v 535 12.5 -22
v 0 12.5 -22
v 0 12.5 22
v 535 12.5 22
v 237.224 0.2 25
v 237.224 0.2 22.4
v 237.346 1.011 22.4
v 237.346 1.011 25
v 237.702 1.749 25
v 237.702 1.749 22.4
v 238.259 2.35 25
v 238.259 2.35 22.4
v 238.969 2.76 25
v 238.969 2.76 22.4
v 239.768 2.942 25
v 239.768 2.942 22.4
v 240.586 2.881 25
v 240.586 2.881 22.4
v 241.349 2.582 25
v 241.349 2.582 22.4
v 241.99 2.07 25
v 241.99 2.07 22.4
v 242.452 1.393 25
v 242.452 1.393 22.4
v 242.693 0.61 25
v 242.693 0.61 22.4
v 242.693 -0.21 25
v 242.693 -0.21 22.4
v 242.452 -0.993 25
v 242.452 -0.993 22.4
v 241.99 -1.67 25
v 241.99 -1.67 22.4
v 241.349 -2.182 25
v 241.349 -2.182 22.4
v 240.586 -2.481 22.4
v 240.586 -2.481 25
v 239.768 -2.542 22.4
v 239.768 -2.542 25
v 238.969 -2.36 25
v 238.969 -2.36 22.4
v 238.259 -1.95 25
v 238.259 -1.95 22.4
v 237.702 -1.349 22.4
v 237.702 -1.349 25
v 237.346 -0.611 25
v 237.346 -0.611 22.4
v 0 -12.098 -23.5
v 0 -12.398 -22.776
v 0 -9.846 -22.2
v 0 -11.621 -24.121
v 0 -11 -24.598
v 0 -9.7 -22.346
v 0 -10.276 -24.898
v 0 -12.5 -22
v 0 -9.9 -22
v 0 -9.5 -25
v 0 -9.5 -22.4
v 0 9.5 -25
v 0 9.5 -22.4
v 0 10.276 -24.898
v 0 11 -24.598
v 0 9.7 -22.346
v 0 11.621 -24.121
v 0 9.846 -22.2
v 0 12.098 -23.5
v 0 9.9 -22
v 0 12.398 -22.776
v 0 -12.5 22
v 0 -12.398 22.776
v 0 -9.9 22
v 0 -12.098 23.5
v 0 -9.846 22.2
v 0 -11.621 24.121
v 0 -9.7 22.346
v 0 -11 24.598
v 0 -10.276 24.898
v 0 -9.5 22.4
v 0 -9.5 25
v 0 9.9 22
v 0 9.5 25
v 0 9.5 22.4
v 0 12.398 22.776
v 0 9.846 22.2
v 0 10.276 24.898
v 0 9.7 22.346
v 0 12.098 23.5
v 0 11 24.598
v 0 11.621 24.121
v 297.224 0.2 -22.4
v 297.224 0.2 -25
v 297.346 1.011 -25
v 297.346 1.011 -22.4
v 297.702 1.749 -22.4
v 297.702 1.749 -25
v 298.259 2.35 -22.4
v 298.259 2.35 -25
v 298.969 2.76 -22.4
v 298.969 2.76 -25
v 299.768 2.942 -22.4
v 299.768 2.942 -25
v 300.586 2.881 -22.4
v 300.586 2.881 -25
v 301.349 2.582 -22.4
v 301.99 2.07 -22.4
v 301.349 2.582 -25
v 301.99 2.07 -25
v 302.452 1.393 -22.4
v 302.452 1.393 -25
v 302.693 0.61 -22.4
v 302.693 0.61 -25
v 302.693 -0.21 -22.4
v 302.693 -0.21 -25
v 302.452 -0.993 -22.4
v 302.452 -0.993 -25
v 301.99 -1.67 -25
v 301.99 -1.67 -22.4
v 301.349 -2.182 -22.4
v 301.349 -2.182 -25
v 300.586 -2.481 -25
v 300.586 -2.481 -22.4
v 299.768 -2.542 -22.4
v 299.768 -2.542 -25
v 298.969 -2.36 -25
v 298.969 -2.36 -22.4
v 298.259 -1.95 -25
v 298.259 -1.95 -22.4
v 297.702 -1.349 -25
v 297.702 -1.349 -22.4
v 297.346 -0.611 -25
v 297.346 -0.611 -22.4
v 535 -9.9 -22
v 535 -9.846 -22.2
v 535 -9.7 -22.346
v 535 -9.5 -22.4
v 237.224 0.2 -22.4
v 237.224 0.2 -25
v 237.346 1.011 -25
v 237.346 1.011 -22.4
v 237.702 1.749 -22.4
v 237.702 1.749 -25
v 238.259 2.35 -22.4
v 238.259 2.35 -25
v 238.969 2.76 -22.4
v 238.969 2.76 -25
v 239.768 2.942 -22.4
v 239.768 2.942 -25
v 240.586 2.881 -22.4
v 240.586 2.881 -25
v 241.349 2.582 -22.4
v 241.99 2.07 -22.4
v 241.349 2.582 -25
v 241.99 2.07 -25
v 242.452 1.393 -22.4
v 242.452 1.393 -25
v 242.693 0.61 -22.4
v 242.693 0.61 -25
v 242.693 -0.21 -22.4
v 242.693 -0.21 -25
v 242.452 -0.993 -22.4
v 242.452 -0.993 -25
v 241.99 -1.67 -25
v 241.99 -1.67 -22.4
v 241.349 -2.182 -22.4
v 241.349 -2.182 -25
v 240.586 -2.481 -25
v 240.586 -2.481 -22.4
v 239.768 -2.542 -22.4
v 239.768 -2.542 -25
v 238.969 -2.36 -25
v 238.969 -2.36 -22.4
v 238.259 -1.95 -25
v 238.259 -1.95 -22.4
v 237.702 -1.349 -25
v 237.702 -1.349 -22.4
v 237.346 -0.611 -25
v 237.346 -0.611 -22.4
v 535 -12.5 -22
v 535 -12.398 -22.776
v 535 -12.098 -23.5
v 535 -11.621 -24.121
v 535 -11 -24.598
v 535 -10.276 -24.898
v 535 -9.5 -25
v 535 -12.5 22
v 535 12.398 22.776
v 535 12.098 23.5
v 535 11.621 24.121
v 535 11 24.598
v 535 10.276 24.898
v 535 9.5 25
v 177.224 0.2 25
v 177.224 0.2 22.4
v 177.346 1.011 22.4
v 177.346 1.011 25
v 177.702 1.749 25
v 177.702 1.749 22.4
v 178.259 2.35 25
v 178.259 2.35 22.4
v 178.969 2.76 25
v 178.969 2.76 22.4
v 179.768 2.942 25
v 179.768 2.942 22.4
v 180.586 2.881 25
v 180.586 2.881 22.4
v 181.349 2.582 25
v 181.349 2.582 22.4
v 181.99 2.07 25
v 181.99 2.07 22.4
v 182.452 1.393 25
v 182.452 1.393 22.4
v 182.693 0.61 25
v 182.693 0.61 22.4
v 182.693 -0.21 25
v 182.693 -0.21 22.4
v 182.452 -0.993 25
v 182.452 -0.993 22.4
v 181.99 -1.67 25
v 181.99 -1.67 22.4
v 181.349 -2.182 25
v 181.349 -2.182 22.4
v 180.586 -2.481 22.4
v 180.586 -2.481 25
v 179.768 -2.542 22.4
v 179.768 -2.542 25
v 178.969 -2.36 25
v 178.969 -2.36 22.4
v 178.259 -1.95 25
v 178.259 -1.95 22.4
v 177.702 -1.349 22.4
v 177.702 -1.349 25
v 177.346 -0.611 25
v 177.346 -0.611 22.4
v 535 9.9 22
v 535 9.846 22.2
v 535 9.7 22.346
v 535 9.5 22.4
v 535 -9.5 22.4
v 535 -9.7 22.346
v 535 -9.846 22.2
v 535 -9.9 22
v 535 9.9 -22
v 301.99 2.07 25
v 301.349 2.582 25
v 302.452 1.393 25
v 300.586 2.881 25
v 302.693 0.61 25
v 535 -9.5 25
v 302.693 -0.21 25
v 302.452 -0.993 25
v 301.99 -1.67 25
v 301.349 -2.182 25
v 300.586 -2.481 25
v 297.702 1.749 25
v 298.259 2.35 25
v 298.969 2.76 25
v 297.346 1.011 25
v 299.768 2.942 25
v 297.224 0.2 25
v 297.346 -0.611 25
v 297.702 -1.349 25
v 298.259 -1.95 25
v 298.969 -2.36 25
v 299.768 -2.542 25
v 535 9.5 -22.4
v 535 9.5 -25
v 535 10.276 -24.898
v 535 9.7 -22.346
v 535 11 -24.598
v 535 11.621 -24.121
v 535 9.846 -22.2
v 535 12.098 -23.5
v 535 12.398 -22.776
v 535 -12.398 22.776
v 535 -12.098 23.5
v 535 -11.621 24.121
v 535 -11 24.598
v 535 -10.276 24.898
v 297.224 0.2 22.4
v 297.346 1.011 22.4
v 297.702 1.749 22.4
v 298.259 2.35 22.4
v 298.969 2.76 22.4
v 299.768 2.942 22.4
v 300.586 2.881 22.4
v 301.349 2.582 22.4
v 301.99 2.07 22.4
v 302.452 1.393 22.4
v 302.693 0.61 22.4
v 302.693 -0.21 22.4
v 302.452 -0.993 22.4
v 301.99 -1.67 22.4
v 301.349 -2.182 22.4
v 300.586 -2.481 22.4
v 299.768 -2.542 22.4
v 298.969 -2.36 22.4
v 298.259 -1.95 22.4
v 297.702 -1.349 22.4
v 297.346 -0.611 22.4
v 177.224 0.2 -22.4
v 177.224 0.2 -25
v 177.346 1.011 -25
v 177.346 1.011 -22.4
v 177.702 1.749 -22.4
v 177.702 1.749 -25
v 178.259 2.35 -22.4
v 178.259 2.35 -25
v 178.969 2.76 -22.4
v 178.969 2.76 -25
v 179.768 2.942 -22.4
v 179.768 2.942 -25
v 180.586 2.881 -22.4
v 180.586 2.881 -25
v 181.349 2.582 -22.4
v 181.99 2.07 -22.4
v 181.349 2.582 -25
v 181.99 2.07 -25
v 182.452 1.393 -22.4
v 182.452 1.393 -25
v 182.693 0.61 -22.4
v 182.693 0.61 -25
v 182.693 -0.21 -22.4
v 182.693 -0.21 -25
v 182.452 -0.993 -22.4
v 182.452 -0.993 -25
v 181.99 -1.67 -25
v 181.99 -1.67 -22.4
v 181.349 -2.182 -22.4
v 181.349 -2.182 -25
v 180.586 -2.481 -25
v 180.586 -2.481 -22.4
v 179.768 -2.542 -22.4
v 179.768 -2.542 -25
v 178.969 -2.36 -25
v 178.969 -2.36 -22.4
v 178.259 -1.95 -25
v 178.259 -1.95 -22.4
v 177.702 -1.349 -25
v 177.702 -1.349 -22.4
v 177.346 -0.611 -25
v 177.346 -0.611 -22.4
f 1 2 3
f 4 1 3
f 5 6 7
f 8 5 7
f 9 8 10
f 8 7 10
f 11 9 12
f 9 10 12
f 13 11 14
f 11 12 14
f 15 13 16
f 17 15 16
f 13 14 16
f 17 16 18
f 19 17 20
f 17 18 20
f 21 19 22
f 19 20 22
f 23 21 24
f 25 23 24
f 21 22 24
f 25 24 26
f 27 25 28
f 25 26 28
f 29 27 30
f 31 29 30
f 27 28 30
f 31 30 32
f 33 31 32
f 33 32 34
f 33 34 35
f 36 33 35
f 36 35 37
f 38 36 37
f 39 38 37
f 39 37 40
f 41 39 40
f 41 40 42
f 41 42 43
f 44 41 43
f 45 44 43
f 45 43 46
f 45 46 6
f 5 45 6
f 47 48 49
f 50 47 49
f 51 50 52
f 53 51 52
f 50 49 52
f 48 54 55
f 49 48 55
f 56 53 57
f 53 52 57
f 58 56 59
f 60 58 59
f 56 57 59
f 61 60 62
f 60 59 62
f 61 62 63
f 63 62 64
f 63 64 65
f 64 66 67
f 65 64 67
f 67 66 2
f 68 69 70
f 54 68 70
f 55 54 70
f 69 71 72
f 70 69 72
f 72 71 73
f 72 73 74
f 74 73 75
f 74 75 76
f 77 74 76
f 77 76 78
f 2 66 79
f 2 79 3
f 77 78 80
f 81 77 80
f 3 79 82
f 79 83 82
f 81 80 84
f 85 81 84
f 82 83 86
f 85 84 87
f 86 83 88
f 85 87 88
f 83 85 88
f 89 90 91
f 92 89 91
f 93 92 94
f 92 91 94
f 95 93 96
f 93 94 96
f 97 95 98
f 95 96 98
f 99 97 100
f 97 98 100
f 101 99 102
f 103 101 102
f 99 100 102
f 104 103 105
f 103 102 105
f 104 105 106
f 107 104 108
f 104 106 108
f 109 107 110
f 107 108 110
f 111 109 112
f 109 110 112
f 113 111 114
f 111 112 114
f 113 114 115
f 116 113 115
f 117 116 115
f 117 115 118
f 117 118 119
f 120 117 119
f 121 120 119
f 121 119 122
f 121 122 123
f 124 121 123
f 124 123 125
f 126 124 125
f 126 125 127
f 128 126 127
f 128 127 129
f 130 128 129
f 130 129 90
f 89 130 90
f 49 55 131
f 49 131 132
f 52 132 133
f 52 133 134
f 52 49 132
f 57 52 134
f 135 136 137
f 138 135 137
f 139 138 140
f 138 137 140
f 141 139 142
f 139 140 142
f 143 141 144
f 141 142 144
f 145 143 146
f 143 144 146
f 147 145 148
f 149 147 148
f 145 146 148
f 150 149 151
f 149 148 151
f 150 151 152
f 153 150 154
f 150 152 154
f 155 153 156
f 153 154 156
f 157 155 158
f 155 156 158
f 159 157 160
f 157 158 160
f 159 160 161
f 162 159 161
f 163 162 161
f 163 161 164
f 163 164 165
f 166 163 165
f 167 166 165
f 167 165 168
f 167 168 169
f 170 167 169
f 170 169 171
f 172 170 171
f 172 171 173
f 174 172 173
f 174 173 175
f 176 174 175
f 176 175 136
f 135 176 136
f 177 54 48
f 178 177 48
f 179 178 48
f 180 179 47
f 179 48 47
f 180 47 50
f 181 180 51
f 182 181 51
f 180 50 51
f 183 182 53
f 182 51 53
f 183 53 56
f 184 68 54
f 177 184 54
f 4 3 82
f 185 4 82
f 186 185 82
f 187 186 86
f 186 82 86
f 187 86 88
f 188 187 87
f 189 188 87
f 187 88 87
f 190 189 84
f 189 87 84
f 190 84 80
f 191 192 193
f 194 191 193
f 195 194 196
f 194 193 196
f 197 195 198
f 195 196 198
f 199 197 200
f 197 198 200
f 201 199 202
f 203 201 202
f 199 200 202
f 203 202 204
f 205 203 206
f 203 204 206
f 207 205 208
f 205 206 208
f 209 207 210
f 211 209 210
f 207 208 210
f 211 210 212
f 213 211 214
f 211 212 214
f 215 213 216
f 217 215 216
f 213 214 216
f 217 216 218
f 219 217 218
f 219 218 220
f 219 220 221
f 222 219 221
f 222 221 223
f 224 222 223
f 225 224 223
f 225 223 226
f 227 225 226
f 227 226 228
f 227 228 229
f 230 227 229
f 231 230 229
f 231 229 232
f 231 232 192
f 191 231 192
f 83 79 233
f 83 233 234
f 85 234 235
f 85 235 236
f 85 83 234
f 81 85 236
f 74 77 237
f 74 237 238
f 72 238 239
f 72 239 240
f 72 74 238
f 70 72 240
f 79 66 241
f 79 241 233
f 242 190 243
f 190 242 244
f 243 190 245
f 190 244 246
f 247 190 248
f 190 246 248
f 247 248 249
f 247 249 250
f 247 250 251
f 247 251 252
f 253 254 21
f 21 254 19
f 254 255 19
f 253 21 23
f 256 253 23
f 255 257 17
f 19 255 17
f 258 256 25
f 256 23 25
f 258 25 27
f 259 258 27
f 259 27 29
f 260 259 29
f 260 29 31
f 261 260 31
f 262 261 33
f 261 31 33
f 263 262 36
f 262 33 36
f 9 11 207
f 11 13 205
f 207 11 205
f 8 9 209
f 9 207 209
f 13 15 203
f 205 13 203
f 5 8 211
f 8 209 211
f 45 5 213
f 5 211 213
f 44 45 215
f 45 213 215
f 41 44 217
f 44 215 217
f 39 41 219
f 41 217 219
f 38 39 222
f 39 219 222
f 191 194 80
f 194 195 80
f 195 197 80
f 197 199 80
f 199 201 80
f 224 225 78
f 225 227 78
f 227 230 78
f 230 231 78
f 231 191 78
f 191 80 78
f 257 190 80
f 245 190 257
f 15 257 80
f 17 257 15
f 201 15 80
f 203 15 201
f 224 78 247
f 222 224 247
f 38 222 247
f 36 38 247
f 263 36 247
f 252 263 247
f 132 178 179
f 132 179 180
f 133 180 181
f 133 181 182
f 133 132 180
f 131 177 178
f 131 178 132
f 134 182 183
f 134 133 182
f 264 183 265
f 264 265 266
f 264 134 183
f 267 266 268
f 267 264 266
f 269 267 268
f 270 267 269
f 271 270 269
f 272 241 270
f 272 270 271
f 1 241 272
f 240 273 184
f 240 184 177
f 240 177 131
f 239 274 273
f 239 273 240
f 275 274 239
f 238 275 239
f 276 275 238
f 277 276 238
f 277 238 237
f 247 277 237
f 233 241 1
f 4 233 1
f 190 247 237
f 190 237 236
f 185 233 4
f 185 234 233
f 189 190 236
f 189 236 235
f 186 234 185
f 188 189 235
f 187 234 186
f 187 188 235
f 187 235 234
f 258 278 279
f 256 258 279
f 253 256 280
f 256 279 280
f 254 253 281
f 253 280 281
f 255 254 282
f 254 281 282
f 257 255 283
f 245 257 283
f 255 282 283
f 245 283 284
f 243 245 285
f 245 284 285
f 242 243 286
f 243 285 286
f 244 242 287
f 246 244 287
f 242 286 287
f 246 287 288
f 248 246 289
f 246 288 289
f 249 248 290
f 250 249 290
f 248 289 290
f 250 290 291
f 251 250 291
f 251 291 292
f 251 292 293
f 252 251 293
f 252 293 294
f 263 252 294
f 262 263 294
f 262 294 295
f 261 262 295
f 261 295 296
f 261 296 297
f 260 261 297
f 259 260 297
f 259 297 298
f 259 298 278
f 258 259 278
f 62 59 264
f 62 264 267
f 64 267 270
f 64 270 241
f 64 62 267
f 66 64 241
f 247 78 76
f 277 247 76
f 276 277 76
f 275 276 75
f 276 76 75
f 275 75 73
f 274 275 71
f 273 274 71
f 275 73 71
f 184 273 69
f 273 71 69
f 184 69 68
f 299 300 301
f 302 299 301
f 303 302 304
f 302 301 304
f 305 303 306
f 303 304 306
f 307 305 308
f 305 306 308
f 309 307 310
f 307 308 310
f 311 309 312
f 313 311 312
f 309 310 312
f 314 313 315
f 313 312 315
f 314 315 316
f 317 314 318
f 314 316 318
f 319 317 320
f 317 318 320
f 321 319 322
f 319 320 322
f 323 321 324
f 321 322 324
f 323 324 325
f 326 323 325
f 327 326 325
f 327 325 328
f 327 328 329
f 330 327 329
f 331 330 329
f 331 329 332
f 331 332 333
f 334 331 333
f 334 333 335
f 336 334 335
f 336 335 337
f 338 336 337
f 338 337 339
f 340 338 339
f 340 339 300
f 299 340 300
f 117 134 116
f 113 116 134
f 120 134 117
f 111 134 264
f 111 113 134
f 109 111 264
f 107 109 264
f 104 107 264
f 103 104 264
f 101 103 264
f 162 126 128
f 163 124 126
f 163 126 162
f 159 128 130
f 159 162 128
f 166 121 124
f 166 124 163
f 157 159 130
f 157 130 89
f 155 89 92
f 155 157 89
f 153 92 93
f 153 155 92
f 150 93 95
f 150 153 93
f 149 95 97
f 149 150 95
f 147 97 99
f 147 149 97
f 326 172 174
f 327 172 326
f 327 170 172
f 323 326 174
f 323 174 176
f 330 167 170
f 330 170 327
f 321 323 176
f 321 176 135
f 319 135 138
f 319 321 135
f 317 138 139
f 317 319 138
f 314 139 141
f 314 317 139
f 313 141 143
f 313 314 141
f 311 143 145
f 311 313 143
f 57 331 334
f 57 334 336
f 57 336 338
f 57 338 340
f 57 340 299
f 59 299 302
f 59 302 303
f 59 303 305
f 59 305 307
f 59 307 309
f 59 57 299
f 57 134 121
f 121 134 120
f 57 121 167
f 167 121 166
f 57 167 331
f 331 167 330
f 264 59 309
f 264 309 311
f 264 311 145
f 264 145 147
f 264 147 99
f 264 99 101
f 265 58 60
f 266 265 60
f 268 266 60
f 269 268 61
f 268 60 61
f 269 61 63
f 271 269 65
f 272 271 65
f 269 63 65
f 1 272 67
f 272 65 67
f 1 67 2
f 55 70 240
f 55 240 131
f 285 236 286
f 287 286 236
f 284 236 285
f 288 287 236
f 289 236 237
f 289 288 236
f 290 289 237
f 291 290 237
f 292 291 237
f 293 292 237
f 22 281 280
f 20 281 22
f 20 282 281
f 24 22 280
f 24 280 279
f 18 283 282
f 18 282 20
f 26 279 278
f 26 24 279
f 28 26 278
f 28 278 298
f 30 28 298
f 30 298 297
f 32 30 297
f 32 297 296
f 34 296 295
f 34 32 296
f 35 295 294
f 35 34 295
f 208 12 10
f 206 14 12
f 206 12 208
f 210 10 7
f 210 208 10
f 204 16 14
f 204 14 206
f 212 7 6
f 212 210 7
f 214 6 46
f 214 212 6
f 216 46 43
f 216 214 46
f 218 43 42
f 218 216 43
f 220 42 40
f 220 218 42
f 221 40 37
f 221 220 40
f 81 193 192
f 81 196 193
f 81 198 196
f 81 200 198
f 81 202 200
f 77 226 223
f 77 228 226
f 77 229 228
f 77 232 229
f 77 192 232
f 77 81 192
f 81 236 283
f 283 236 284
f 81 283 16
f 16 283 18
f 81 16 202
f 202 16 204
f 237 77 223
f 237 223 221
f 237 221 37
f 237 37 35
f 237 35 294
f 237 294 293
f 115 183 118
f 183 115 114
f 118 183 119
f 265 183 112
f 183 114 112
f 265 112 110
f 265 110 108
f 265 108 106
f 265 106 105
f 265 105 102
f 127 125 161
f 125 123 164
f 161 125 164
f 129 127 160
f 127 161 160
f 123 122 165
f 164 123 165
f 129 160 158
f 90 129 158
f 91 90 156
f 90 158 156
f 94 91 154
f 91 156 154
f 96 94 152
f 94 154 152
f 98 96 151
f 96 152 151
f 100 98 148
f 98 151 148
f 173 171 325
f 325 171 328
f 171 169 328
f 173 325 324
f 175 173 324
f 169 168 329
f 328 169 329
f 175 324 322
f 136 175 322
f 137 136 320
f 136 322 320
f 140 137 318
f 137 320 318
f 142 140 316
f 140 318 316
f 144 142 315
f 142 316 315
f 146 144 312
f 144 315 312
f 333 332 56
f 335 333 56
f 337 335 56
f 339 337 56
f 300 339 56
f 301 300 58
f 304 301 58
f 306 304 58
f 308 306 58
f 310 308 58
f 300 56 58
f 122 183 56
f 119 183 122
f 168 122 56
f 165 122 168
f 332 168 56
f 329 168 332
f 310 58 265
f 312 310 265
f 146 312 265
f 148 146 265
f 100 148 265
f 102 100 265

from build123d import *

# Parameters (mm, degrees)
TUBO_RETANGULAR_50_X_30_X_2_6_1_DEPTH = 535
ESBO_O2_R                             = 2.75
CORTE_EXTRUS_O1_DEPTH                 = 538.476743683


with BuildPart() as part:
    # Sketch1 → Tubo retangular 50 X 30 X 2.6(1) (new body)
    with BuildSketch(Plane.YZ):
        with BuildLine():
            Line((-9.5, -25), (9.5, -25))
            ThreePointArc((9.5, -25), (11.621320344, -24.121320344), (12.5, -22))
            Line((12.5, -22), (12.5, 22))
            ThreePointArc((12.5, 22), (11.621320344, 24.121320344), (9.5, 25))
            Line((9.5, 25), (-9.5, 25))
            ThreePointArc((-9.5, 25), (-11.621320344, 24.121320344), (-12.5, 22))
            Line((-12.5, 22), (-12.5, -22))
            ThreePointArc((-12.5, -22), (-11.621320344, -24.121320344), (-9.5, -25))
        make_face()
        with BuildLine():
            Line((-9.5, -22.4), (9.5, -22.4))
            ThreePointArc((9.5, -22.4), (9.782842712, -22.282842712), (9.9, -22))
            Line((9.9, -22), (9.9, 22))
            ThreePointArc((9.9, 22), (9.782842712, 22.282842712), (9.5, 22.4))
            Line((9.5, 22.4), (-9.5, 22.4))
            ThreePointArc((-9.5, 22.4), (-9.782842712, 22.282842712), (-9.9, 22))
            Line((-9.9, 22), (-9.9, -22))
            ThreePointArc((-9.9, -22), (-9.782842712, -22.282842712), (-9.5, -22.4))
        make_face(mode=Mode.SUBTRACT)
    extrude(amount=TUBO_RETANGULAR_50_X_30_X_2_6_1_DEPTH)

    # Esboço2 → Corte-extrusão1 (cut, through all)
    with BuildSketch(Plane(origin=(0, 0, -25), x_dir=(-1, 0, 0), z_dir=(0, 0, -1))):
        with Locations((-179.973841655, 0.2)):
            Circle(ESBO_O2_R)
        with Locations((-239.973841655, 0.2)):
            Circle(ESBO_O2_R)
        with Locations((-299.973841655, 0.2)):
            Circle(ESBO_O2_R)
    extrude(amount=-CORTE_EXTRUS_O1_DEPTH, mode=Mode.SUBTRACT)


solid = part.part
